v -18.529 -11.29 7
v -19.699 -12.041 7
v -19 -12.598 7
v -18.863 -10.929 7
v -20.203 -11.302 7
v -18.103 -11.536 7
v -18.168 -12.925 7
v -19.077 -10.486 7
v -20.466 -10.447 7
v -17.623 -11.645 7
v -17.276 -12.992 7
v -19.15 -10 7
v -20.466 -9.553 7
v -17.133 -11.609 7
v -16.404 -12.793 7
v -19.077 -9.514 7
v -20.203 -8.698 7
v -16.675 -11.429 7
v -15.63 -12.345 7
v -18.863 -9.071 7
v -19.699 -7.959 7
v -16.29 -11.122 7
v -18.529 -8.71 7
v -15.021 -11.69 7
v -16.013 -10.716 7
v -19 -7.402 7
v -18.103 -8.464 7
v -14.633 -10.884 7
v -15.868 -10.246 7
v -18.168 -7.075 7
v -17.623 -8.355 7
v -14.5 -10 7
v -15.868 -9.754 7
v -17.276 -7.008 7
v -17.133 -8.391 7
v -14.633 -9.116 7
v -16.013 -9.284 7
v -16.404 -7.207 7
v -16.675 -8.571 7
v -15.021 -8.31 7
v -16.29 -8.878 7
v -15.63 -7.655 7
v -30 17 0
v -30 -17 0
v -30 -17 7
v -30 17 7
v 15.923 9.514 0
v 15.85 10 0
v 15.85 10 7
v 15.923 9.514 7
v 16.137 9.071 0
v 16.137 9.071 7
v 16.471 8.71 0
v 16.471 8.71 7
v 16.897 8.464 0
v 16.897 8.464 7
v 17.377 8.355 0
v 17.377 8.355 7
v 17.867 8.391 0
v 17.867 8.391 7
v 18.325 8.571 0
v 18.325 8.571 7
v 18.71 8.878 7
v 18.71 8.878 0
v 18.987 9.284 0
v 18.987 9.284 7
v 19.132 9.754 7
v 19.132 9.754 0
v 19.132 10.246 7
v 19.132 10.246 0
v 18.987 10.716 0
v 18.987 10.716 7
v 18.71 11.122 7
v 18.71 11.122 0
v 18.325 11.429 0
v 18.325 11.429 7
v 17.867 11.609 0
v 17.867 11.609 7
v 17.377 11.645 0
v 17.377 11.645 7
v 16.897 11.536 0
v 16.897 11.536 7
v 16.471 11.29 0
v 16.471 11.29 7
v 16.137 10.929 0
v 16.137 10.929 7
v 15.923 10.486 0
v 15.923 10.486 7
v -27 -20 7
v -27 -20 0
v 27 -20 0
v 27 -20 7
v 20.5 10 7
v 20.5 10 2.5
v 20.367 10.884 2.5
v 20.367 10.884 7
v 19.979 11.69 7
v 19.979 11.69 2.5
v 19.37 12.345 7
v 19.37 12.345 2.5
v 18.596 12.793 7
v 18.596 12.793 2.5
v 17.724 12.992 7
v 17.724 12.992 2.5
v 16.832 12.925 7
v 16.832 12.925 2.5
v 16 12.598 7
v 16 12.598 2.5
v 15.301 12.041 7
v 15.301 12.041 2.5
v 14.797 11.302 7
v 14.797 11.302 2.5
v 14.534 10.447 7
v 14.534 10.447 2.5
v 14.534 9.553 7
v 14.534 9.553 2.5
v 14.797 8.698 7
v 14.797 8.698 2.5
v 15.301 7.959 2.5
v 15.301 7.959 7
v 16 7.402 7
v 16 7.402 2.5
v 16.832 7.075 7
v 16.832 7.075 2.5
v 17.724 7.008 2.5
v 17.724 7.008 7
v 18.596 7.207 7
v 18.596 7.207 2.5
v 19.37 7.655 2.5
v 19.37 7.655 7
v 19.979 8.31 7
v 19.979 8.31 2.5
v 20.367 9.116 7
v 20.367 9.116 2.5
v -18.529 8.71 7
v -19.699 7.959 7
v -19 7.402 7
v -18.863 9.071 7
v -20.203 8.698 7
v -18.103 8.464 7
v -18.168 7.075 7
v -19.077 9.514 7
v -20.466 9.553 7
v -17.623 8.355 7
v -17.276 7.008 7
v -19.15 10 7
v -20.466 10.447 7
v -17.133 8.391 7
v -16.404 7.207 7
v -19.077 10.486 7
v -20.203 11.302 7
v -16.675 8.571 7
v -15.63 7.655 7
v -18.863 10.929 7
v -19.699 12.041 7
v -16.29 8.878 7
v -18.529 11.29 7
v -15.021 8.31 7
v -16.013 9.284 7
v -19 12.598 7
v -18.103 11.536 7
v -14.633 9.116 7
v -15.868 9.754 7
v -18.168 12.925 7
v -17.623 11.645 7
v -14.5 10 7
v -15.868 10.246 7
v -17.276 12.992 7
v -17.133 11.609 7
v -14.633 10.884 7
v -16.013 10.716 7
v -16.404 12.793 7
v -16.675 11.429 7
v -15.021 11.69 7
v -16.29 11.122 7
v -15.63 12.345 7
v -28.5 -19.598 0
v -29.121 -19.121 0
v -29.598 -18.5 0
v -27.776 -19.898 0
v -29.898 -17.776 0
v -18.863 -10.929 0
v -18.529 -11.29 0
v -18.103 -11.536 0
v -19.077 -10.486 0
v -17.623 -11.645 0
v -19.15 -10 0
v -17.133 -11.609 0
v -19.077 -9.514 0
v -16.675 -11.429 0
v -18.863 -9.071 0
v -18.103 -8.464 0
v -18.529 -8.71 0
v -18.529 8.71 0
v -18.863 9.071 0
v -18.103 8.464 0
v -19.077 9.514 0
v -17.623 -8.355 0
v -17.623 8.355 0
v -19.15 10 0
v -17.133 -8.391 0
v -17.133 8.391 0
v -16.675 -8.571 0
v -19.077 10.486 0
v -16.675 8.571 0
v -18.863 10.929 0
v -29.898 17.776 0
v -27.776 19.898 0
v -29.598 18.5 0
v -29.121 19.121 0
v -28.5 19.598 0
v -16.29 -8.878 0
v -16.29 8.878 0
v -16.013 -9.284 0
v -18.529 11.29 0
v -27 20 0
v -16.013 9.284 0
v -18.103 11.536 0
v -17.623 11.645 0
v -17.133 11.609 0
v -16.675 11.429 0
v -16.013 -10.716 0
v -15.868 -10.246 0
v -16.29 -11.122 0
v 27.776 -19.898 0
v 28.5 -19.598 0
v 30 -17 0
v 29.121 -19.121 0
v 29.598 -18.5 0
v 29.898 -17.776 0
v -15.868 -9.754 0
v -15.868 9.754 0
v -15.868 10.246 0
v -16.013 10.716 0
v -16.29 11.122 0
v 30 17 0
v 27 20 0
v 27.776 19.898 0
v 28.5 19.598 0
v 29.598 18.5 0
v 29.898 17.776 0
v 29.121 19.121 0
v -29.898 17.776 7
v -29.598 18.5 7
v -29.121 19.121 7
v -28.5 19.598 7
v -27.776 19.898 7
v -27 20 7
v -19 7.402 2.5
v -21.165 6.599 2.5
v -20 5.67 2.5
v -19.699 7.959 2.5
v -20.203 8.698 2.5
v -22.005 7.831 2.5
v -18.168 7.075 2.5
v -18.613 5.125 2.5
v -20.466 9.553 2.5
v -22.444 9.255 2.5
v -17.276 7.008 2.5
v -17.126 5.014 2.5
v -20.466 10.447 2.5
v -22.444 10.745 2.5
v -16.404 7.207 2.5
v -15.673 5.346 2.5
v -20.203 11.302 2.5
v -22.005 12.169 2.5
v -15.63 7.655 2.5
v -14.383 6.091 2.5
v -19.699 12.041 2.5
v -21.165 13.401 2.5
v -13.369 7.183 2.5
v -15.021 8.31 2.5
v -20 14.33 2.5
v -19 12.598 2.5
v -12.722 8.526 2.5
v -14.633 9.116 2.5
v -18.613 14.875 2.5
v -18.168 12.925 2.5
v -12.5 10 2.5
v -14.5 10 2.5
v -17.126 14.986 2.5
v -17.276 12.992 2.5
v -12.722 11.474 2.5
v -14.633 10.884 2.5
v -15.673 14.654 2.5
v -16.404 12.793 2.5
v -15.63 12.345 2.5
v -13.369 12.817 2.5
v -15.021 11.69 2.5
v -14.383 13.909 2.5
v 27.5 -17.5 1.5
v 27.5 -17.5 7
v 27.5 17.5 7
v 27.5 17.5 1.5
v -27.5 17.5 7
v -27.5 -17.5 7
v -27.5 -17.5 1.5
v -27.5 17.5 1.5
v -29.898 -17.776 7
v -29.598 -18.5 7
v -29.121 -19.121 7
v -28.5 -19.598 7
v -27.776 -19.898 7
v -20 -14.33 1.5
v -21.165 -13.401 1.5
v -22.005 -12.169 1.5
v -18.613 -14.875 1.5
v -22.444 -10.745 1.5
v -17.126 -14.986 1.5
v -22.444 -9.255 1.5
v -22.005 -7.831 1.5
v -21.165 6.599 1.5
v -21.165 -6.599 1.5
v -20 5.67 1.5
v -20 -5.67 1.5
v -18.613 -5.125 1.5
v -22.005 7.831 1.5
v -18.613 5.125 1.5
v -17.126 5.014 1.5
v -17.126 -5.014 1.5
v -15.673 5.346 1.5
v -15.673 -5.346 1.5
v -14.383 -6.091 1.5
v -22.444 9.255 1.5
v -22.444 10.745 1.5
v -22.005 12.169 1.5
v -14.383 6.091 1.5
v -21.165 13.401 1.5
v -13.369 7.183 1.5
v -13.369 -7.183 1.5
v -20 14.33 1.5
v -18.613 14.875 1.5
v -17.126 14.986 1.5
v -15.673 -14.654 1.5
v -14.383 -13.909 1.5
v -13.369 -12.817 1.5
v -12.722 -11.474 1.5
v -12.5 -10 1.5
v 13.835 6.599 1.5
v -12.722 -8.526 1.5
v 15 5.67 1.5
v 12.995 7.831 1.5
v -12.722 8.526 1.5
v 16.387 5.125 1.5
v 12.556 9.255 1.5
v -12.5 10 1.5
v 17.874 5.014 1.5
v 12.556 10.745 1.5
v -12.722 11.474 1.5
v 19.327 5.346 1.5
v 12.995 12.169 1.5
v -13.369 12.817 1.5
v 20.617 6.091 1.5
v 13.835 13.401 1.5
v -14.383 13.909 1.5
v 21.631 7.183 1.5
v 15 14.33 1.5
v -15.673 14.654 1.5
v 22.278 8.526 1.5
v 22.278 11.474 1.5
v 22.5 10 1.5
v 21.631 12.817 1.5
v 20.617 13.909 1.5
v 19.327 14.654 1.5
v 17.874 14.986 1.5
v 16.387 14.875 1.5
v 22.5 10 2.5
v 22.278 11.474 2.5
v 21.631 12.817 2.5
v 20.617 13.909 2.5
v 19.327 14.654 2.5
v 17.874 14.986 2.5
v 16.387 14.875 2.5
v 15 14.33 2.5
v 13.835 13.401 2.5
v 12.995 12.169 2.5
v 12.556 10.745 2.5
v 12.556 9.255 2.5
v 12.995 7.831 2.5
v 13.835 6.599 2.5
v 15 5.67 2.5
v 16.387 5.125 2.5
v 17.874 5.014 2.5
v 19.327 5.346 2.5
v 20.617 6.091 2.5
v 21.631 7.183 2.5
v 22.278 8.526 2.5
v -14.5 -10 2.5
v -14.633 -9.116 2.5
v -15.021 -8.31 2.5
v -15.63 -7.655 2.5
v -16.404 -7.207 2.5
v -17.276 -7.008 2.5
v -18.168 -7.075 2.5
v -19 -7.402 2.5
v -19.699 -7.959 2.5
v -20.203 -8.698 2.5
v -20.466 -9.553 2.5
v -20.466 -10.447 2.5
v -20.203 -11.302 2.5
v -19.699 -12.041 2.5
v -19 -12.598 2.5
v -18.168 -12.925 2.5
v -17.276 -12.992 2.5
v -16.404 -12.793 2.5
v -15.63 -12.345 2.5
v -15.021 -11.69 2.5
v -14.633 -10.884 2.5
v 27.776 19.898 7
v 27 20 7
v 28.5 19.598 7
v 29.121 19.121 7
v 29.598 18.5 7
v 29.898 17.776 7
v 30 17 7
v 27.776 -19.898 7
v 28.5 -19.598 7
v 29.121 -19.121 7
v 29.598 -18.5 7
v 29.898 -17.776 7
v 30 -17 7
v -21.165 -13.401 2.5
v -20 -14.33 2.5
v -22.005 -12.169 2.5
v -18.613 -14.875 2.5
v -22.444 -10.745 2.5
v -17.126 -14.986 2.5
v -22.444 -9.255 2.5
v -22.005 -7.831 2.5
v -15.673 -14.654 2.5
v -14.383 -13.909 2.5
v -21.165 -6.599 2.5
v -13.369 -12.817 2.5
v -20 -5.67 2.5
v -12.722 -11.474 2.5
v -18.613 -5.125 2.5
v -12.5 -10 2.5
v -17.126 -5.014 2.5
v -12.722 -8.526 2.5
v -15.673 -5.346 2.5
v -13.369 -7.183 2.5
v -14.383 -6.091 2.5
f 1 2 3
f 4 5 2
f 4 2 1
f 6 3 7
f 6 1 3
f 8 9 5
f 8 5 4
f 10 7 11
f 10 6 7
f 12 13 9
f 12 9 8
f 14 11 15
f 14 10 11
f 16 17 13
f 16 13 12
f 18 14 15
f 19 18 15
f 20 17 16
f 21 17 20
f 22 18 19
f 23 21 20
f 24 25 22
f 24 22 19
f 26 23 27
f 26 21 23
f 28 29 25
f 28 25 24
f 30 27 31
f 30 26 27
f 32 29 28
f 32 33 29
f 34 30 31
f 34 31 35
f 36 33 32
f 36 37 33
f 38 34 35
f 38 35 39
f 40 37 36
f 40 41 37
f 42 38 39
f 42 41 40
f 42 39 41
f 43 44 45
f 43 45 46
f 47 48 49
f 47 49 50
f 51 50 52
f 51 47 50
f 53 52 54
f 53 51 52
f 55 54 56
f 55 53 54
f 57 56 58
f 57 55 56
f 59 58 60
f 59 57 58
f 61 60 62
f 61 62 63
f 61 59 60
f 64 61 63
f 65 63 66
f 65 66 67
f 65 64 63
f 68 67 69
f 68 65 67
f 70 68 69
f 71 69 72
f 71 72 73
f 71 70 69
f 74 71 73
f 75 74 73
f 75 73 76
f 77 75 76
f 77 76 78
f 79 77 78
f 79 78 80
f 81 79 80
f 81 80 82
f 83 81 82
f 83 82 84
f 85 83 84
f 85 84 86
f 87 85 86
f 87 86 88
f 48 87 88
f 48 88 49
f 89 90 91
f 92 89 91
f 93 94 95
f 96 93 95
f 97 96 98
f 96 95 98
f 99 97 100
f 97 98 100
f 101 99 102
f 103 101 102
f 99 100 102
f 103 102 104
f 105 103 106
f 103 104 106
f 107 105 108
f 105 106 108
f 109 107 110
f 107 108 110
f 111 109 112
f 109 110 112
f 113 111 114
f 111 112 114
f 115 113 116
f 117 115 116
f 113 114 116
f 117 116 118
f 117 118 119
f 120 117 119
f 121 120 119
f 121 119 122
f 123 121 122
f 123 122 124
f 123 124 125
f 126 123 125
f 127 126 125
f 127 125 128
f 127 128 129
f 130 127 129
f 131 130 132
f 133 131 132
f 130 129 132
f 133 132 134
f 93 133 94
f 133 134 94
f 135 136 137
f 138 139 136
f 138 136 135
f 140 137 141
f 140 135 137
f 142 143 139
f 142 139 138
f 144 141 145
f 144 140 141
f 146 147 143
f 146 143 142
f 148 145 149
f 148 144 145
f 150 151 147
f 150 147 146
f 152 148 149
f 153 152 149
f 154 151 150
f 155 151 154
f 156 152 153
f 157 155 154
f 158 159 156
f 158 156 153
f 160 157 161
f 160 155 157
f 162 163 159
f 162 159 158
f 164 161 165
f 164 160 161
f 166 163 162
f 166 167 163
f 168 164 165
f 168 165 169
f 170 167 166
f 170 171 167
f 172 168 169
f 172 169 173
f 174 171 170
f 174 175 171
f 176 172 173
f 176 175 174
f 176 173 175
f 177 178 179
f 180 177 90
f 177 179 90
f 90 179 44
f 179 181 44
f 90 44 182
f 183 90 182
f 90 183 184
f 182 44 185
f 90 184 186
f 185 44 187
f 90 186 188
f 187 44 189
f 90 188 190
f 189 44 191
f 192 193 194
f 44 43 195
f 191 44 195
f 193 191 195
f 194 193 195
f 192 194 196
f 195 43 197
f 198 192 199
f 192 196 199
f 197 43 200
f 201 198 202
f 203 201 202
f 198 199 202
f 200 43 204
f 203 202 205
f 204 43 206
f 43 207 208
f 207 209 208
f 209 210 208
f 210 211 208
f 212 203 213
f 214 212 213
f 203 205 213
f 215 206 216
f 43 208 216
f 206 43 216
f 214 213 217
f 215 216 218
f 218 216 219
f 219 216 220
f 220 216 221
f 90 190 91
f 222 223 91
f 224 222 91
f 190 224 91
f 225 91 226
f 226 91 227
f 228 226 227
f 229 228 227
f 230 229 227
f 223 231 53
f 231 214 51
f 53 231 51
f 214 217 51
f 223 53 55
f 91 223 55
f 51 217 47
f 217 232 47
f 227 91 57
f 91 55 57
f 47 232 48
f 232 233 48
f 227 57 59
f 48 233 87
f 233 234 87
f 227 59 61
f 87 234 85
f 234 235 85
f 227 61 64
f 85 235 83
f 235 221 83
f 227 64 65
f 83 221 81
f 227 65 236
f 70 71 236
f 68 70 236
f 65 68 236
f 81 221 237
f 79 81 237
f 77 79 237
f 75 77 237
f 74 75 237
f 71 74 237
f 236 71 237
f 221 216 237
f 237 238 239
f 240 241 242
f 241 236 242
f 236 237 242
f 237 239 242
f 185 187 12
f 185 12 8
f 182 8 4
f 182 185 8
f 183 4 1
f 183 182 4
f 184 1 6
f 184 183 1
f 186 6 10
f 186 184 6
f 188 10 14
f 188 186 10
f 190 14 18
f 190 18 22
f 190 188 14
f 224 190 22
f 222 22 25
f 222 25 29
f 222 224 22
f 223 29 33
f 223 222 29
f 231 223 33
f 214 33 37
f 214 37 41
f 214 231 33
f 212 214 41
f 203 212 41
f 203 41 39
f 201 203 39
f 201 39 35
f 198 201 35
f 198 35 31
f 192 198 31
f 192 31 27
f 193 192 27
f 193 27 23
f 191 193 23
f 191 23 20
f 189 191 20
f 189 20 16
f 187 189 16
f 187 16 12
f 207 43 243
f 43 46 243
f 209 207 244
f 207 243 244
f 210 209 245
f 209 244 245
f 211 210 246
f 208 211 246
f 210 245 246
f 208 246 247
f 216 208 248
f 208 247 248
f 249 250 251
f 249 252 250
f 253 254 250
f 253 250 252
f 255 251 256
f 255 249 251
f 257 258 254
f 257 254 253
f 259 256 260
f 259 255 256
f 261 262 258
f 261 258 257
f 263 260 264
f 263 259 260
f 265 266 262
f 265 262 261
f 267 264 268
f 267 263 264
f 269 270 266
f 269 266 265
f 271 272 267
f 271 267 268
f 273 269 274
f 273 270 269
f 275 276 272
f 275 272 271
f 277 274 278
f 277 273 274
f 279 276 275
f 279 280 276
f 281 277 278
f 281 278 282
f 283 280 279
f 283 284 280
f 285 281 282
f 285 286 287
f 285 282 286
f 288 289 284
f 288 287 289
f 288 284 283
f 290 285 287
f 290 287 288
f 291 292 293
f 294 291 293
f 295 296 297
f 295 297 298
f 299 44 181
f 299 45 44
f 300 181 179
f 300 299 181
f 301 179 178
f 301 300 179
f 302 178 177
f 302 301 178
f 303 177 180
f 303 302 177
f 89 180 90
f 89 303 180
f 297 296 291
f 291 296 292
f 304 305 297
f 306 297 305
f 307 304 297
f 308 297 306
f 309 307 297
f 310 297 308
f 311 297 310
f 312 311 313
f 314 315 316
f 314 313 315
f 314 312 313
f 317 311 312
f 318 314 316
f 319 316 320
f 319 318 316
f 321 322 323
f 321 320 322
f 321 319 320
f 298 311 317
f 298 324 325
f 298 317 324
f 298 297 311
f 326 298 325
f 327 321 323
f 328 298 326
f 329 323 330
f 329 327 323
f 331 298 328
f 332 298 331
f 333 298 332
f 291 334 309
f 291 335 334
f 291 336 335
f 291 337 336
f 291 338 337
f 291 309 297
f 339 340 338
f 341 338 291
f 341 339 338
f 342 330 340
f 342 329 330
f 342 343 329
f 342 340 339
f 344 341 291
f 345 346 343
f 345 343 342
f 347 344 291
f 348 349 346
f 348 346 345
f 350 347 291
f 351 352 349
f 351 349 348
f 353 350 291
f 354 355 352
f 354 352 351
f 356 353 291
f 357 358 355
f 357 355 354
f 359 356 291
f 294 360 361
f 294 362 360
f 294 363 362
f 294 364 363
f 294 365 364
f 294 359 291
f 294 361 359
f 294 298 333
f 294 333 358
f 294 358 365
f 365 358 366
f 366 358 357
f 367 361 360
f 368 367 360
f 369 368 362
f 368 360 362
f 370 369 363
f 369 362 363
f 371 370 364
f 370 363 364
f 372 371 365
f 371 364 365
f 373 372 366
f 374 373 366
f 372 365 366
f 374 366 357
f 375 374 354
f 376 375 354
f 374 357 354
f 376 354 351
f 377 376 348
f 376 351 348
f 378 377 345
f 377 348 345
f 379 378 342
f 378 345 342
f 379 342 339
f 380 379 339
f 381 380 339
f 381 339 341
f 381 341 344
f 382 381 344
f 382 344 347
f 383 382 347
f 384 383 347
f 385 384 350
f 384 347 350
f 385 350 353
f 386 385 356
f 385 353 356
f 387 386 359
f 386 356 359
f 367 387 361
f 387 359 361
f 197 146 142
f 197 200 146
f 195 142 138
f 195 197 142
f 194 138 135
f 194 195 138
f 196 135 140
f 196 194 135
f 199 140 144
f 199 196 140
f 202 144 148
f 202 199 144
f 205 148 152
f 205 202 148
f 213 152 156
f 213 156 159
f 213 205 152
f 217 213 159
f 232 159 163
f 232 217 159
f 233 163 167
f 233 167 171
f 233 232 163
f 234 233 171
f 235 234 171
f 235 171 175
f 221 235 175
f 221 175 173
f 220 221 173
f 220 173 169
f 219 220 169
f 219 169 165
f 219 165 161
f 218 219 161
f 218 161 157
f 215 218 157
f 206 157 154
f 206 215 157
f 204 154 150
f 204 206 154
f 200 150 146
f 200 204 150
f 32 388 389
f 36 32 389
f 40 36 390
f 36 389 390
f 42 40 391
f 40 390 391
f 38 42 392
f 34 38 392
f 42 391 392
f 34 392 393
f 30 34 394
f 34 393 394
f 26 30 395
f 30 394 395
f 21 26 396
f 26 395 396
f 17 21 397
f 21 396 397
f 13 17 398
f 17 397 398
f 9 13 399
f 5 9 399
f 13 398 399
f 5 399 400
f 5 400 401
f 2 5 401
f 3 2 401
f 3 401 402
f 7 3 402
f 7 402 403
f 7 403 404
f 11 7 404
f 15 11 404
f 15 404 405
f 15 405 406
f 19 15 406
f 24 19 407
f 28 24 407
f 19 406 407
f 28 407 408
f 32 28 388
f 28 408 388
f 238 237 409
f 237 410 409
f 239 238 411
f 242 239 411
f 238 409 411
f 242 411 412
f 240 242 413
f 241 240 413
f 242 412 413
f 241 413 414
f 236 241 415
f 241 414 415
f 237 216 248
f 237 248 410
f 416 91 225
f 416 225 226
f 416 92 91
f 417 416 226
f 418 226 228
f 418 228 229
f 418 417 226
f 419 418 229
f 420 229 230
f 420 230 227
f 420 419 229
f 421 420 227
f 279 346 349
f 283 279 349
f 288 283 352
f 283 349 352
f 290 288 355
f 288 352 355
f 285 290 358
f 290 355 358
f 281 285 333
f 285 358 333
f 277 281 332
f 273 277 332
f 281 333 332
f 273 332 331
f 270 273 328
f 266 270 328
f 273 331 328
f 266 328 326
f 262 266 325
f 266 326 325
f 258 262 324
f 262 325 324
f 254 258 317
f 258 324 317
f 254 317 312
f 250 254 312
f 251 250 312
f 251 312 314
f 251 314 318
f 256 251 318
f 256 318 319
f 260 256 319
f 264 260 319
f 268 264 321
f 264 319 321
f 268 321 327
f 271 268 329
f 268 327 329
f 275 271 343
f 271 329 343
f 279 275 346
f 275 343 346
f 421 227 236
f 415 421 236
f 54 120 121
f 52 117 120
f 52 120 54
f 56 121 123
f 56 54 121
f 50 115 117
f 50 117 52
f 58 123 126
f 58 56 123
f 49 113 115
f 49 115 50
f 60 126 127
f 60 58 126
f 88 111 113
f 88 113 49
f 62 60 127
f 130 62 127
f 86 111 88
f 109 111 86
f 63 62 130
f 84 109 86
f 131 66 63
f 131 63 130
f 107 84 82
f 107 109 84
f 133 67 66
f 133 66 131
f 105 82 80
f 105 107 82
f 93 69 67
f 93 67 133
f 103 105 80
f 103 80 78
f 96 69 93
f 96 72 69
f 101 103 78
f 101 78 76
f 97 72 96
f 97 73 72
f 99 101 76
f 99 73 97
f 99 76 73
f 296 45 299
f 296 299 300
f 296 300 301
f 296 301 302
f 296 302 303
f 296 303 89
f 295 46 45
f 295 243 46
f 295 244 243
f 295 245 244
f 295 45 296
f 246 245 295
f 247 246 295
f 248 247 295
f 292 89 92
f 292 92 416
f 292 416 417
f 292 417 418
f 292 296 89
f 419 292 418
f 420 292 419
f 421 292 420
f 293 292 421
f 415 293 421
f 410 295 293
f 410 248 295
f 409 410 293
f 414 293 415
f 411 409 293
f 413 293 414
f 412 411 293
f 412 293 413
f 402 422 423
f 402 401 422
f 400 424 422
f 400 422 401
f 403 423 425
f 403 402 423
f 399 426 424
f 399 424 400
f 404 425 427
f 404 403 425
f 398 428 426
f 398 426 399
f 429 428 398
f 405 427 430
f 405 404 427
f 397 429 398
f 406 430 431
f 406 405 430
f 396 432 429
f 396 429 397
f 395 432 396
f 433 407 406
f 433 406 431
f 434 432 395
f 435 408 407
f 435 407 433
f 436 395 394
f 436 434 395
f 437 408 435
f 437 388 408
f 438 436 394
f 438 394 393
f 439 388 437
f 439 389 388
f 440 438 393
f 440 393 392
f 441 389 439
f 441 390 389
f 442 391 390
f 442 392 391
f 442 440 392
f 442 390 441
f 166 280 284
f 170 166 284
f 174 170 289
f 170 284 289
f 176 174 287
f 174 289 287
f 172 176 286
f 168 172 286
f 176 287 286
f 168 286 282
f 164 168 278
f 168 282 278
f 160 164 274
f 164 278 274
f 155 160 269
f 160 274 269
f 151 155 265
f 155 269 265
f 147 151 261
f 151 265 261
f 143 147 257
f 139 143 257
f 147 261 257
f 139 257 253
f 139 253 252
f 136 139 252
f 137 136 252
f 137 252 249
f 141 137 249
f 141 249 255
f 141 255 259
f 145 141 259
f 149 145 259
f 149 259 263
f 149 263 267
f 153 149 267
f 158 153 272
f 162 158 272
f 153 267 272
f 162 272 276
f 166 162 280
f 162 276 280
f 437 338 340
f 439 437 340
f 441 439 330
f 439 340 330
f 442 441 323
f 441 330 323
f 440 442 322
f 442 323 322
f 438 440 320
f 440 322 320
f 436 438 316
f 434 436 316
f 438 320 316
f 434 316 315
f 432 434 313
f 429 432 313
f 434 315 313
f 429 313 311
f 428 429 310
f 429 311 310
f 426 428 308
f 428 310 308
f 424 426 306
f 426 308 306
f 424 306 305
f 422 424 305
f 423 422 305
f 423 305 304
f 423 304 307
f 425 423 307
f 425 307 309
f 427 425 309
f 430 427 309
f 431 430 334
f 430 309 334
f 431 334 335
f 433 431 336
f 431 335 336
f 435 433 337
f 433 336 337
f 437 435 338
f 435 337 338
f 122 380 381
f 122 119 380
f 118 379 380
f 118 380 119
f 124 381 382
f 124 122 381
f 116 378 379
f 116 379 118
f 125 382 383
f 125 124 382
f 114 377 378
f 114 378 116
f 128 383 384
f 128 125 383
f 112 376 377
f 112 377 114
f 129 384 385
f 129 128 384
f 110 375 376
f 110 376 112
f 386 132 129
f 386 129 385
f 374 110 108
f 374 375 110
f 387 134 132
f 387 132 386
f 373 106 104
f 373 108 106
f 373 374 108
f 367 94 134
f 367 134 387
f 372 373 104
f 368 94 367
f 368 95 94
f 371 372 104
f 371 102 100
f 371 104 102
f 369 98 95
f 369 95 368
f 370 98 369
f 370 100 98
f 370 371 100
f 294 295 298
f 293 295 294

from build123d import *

# Parameters (mm, degrees)
CROQUIS1_W              = 60
CROQUIS1_H              = 40
SALIENTE_EXTRUIR1_DEPTH = 7
CROQUIS2_W              = 55
CROQUIS2_H              = 35
CORTAR_EXTRUIR1_DEPTH   = 5.5
REDONDEO1_R             = 3
CROQUIS3_R              = 1.65
CORTAR_EXTRUIR2_DEPTH   = 30.5
CROQUIS5_R              = 5
CROQUIS5_R_2            = 1.65
SALIENTE_EXTRUIR2_DEPTH = 1
CROQUIS6_R              = 3
CROQUIS6_R_2            = 1.65
SALIENTE_EXTRUIR3_DEPTH = 4.5


with BuildPart() as part:
    # Croquis1 → Saliente-Extruir1 (new body)
    with BuildSketch(Plane.XY):
        Rectangle(CROQUIS1_W, CROQUIS1_H)
    extrude(amount=SALIENTE_EXTRUIR1_DEPTH)

    # Croquis2 → Cortar-Extruir1 (cut)
    with BuildSketch(Plane.XY.offset(7)):
        Rectangle(CROQUIS2_W, CROQUIS2_H)
    extrude(amount=-CORTAR_EXTRUIR1_DEPTH, mode=Mode.SUBTRACT)

    # Redondeo1
    redondeo1_edges = [part.edges().sort_by_distance(p)[0] for p in [
        (-30, 20, 3.5),
        (30, 20, 3.5),
        (30, -20, 3.5),
        (-30, -20, 3.5),
    ]]
    fillet(redondeo1_edges, radius=REDONDEO1_R)

    # Croquis3 → Cortar-Extruir2 (cut)
    with BuildSketch(Plane(origin=(0, 0, 0), x_dir=(-1, 0, 0), z_dir=(0, 0, -1))):
        with Locations((-17.5, 10)):
            Circle(CROQUIS3_R)
        with Locations((17.5, 10)):
            Circle(CROQUIS3_R)
        with Locations((17.5, -10)):
            Circle(CROQUIS3_R)
    extrude(amount=-CORTAR_EXTRUIR2_DEPTH, mode=Mode.SUBTRACT)

    # Croquis5 → Saliente-Extruir2 (add)
    # profile 1 of 3: a face of its own
    with BuildSketch(Plane.XY.offset(1.5)):
        with Locations((-17.5, 10)):
            Circle(CROQUIS5_R)
        with Locations(Location((-17.5, 10, 0), (0, 0, 180))):
            Circle(CROQUIS5_R_2, mode=Mode.SUBTRACT)
    # profile 2 of 3: a face of its own
    with BuildSketch(Plane.XY.offset(1.5)):
        with Locations((17.5, 10)):
            Circle(CROQUIS5_R)
        with Locations(Location((17.5, 10, 0), (0, 0, 180))):
            Circle(CROQUIS5_R_2, mode=Mode.SUBTRACT)
    # profile 3 of 3: a face of its own
    with BuildSketch(Plane.XY.offset(1.5)):
        with Locations((-17.5, -10)):
            Circle(CROQUIS5_R)
        with Locations(Location((-17.5, -10, 0), (0, 0, 180))):
            Circle(CROQUIS5_R_2, mode=Mode.SUBTRACT)
    extrude(amount=SALIENTE_EXTRUIR2_DEPTH)

    # Croquis6 → Saliente-Extruir3 (add)
    # profile 1 of 3: a face of its own
    with BuildSketch(Plane.XY.offset(2.5)):
        with Locations((-17.5, 10)):
            Circle(CROQUIS6_R)
        with Locations(Location((-17.5, 10, 0), (0, 0, 180))):
            Circle(CROQUIS6_R_2, mode=Mode.SUBTRACT)
    # profile 2 of 3: a face of its own
    with BuildSketch(Plane.XY.offset(2.5)):
        with Locations((17.5, 10)):
            Circle(CROQUIS6_R)
        with Locations(Location((17.5, 10, 0), (0, 0, 180))):
            Circle(CROQUIS6_R_2, mode=Mode.SUBTRACT)
    # profile 3 of 3: a face of its own
    with BuildSketch(Plane.XY.offset(2.5)):
        with Locations((-17.5, -10)):
            Circle(CROQUIS6_R)
        with Locations(Location((-17.5, -10, 0), (0, 0, 180))):
            Circle(CROQUIS6_R_2, mode=Mode.SUBTRACT)
    extrude(amount=SALIENTE_EXTRUIR3_DEPTH)


solid = part.part
